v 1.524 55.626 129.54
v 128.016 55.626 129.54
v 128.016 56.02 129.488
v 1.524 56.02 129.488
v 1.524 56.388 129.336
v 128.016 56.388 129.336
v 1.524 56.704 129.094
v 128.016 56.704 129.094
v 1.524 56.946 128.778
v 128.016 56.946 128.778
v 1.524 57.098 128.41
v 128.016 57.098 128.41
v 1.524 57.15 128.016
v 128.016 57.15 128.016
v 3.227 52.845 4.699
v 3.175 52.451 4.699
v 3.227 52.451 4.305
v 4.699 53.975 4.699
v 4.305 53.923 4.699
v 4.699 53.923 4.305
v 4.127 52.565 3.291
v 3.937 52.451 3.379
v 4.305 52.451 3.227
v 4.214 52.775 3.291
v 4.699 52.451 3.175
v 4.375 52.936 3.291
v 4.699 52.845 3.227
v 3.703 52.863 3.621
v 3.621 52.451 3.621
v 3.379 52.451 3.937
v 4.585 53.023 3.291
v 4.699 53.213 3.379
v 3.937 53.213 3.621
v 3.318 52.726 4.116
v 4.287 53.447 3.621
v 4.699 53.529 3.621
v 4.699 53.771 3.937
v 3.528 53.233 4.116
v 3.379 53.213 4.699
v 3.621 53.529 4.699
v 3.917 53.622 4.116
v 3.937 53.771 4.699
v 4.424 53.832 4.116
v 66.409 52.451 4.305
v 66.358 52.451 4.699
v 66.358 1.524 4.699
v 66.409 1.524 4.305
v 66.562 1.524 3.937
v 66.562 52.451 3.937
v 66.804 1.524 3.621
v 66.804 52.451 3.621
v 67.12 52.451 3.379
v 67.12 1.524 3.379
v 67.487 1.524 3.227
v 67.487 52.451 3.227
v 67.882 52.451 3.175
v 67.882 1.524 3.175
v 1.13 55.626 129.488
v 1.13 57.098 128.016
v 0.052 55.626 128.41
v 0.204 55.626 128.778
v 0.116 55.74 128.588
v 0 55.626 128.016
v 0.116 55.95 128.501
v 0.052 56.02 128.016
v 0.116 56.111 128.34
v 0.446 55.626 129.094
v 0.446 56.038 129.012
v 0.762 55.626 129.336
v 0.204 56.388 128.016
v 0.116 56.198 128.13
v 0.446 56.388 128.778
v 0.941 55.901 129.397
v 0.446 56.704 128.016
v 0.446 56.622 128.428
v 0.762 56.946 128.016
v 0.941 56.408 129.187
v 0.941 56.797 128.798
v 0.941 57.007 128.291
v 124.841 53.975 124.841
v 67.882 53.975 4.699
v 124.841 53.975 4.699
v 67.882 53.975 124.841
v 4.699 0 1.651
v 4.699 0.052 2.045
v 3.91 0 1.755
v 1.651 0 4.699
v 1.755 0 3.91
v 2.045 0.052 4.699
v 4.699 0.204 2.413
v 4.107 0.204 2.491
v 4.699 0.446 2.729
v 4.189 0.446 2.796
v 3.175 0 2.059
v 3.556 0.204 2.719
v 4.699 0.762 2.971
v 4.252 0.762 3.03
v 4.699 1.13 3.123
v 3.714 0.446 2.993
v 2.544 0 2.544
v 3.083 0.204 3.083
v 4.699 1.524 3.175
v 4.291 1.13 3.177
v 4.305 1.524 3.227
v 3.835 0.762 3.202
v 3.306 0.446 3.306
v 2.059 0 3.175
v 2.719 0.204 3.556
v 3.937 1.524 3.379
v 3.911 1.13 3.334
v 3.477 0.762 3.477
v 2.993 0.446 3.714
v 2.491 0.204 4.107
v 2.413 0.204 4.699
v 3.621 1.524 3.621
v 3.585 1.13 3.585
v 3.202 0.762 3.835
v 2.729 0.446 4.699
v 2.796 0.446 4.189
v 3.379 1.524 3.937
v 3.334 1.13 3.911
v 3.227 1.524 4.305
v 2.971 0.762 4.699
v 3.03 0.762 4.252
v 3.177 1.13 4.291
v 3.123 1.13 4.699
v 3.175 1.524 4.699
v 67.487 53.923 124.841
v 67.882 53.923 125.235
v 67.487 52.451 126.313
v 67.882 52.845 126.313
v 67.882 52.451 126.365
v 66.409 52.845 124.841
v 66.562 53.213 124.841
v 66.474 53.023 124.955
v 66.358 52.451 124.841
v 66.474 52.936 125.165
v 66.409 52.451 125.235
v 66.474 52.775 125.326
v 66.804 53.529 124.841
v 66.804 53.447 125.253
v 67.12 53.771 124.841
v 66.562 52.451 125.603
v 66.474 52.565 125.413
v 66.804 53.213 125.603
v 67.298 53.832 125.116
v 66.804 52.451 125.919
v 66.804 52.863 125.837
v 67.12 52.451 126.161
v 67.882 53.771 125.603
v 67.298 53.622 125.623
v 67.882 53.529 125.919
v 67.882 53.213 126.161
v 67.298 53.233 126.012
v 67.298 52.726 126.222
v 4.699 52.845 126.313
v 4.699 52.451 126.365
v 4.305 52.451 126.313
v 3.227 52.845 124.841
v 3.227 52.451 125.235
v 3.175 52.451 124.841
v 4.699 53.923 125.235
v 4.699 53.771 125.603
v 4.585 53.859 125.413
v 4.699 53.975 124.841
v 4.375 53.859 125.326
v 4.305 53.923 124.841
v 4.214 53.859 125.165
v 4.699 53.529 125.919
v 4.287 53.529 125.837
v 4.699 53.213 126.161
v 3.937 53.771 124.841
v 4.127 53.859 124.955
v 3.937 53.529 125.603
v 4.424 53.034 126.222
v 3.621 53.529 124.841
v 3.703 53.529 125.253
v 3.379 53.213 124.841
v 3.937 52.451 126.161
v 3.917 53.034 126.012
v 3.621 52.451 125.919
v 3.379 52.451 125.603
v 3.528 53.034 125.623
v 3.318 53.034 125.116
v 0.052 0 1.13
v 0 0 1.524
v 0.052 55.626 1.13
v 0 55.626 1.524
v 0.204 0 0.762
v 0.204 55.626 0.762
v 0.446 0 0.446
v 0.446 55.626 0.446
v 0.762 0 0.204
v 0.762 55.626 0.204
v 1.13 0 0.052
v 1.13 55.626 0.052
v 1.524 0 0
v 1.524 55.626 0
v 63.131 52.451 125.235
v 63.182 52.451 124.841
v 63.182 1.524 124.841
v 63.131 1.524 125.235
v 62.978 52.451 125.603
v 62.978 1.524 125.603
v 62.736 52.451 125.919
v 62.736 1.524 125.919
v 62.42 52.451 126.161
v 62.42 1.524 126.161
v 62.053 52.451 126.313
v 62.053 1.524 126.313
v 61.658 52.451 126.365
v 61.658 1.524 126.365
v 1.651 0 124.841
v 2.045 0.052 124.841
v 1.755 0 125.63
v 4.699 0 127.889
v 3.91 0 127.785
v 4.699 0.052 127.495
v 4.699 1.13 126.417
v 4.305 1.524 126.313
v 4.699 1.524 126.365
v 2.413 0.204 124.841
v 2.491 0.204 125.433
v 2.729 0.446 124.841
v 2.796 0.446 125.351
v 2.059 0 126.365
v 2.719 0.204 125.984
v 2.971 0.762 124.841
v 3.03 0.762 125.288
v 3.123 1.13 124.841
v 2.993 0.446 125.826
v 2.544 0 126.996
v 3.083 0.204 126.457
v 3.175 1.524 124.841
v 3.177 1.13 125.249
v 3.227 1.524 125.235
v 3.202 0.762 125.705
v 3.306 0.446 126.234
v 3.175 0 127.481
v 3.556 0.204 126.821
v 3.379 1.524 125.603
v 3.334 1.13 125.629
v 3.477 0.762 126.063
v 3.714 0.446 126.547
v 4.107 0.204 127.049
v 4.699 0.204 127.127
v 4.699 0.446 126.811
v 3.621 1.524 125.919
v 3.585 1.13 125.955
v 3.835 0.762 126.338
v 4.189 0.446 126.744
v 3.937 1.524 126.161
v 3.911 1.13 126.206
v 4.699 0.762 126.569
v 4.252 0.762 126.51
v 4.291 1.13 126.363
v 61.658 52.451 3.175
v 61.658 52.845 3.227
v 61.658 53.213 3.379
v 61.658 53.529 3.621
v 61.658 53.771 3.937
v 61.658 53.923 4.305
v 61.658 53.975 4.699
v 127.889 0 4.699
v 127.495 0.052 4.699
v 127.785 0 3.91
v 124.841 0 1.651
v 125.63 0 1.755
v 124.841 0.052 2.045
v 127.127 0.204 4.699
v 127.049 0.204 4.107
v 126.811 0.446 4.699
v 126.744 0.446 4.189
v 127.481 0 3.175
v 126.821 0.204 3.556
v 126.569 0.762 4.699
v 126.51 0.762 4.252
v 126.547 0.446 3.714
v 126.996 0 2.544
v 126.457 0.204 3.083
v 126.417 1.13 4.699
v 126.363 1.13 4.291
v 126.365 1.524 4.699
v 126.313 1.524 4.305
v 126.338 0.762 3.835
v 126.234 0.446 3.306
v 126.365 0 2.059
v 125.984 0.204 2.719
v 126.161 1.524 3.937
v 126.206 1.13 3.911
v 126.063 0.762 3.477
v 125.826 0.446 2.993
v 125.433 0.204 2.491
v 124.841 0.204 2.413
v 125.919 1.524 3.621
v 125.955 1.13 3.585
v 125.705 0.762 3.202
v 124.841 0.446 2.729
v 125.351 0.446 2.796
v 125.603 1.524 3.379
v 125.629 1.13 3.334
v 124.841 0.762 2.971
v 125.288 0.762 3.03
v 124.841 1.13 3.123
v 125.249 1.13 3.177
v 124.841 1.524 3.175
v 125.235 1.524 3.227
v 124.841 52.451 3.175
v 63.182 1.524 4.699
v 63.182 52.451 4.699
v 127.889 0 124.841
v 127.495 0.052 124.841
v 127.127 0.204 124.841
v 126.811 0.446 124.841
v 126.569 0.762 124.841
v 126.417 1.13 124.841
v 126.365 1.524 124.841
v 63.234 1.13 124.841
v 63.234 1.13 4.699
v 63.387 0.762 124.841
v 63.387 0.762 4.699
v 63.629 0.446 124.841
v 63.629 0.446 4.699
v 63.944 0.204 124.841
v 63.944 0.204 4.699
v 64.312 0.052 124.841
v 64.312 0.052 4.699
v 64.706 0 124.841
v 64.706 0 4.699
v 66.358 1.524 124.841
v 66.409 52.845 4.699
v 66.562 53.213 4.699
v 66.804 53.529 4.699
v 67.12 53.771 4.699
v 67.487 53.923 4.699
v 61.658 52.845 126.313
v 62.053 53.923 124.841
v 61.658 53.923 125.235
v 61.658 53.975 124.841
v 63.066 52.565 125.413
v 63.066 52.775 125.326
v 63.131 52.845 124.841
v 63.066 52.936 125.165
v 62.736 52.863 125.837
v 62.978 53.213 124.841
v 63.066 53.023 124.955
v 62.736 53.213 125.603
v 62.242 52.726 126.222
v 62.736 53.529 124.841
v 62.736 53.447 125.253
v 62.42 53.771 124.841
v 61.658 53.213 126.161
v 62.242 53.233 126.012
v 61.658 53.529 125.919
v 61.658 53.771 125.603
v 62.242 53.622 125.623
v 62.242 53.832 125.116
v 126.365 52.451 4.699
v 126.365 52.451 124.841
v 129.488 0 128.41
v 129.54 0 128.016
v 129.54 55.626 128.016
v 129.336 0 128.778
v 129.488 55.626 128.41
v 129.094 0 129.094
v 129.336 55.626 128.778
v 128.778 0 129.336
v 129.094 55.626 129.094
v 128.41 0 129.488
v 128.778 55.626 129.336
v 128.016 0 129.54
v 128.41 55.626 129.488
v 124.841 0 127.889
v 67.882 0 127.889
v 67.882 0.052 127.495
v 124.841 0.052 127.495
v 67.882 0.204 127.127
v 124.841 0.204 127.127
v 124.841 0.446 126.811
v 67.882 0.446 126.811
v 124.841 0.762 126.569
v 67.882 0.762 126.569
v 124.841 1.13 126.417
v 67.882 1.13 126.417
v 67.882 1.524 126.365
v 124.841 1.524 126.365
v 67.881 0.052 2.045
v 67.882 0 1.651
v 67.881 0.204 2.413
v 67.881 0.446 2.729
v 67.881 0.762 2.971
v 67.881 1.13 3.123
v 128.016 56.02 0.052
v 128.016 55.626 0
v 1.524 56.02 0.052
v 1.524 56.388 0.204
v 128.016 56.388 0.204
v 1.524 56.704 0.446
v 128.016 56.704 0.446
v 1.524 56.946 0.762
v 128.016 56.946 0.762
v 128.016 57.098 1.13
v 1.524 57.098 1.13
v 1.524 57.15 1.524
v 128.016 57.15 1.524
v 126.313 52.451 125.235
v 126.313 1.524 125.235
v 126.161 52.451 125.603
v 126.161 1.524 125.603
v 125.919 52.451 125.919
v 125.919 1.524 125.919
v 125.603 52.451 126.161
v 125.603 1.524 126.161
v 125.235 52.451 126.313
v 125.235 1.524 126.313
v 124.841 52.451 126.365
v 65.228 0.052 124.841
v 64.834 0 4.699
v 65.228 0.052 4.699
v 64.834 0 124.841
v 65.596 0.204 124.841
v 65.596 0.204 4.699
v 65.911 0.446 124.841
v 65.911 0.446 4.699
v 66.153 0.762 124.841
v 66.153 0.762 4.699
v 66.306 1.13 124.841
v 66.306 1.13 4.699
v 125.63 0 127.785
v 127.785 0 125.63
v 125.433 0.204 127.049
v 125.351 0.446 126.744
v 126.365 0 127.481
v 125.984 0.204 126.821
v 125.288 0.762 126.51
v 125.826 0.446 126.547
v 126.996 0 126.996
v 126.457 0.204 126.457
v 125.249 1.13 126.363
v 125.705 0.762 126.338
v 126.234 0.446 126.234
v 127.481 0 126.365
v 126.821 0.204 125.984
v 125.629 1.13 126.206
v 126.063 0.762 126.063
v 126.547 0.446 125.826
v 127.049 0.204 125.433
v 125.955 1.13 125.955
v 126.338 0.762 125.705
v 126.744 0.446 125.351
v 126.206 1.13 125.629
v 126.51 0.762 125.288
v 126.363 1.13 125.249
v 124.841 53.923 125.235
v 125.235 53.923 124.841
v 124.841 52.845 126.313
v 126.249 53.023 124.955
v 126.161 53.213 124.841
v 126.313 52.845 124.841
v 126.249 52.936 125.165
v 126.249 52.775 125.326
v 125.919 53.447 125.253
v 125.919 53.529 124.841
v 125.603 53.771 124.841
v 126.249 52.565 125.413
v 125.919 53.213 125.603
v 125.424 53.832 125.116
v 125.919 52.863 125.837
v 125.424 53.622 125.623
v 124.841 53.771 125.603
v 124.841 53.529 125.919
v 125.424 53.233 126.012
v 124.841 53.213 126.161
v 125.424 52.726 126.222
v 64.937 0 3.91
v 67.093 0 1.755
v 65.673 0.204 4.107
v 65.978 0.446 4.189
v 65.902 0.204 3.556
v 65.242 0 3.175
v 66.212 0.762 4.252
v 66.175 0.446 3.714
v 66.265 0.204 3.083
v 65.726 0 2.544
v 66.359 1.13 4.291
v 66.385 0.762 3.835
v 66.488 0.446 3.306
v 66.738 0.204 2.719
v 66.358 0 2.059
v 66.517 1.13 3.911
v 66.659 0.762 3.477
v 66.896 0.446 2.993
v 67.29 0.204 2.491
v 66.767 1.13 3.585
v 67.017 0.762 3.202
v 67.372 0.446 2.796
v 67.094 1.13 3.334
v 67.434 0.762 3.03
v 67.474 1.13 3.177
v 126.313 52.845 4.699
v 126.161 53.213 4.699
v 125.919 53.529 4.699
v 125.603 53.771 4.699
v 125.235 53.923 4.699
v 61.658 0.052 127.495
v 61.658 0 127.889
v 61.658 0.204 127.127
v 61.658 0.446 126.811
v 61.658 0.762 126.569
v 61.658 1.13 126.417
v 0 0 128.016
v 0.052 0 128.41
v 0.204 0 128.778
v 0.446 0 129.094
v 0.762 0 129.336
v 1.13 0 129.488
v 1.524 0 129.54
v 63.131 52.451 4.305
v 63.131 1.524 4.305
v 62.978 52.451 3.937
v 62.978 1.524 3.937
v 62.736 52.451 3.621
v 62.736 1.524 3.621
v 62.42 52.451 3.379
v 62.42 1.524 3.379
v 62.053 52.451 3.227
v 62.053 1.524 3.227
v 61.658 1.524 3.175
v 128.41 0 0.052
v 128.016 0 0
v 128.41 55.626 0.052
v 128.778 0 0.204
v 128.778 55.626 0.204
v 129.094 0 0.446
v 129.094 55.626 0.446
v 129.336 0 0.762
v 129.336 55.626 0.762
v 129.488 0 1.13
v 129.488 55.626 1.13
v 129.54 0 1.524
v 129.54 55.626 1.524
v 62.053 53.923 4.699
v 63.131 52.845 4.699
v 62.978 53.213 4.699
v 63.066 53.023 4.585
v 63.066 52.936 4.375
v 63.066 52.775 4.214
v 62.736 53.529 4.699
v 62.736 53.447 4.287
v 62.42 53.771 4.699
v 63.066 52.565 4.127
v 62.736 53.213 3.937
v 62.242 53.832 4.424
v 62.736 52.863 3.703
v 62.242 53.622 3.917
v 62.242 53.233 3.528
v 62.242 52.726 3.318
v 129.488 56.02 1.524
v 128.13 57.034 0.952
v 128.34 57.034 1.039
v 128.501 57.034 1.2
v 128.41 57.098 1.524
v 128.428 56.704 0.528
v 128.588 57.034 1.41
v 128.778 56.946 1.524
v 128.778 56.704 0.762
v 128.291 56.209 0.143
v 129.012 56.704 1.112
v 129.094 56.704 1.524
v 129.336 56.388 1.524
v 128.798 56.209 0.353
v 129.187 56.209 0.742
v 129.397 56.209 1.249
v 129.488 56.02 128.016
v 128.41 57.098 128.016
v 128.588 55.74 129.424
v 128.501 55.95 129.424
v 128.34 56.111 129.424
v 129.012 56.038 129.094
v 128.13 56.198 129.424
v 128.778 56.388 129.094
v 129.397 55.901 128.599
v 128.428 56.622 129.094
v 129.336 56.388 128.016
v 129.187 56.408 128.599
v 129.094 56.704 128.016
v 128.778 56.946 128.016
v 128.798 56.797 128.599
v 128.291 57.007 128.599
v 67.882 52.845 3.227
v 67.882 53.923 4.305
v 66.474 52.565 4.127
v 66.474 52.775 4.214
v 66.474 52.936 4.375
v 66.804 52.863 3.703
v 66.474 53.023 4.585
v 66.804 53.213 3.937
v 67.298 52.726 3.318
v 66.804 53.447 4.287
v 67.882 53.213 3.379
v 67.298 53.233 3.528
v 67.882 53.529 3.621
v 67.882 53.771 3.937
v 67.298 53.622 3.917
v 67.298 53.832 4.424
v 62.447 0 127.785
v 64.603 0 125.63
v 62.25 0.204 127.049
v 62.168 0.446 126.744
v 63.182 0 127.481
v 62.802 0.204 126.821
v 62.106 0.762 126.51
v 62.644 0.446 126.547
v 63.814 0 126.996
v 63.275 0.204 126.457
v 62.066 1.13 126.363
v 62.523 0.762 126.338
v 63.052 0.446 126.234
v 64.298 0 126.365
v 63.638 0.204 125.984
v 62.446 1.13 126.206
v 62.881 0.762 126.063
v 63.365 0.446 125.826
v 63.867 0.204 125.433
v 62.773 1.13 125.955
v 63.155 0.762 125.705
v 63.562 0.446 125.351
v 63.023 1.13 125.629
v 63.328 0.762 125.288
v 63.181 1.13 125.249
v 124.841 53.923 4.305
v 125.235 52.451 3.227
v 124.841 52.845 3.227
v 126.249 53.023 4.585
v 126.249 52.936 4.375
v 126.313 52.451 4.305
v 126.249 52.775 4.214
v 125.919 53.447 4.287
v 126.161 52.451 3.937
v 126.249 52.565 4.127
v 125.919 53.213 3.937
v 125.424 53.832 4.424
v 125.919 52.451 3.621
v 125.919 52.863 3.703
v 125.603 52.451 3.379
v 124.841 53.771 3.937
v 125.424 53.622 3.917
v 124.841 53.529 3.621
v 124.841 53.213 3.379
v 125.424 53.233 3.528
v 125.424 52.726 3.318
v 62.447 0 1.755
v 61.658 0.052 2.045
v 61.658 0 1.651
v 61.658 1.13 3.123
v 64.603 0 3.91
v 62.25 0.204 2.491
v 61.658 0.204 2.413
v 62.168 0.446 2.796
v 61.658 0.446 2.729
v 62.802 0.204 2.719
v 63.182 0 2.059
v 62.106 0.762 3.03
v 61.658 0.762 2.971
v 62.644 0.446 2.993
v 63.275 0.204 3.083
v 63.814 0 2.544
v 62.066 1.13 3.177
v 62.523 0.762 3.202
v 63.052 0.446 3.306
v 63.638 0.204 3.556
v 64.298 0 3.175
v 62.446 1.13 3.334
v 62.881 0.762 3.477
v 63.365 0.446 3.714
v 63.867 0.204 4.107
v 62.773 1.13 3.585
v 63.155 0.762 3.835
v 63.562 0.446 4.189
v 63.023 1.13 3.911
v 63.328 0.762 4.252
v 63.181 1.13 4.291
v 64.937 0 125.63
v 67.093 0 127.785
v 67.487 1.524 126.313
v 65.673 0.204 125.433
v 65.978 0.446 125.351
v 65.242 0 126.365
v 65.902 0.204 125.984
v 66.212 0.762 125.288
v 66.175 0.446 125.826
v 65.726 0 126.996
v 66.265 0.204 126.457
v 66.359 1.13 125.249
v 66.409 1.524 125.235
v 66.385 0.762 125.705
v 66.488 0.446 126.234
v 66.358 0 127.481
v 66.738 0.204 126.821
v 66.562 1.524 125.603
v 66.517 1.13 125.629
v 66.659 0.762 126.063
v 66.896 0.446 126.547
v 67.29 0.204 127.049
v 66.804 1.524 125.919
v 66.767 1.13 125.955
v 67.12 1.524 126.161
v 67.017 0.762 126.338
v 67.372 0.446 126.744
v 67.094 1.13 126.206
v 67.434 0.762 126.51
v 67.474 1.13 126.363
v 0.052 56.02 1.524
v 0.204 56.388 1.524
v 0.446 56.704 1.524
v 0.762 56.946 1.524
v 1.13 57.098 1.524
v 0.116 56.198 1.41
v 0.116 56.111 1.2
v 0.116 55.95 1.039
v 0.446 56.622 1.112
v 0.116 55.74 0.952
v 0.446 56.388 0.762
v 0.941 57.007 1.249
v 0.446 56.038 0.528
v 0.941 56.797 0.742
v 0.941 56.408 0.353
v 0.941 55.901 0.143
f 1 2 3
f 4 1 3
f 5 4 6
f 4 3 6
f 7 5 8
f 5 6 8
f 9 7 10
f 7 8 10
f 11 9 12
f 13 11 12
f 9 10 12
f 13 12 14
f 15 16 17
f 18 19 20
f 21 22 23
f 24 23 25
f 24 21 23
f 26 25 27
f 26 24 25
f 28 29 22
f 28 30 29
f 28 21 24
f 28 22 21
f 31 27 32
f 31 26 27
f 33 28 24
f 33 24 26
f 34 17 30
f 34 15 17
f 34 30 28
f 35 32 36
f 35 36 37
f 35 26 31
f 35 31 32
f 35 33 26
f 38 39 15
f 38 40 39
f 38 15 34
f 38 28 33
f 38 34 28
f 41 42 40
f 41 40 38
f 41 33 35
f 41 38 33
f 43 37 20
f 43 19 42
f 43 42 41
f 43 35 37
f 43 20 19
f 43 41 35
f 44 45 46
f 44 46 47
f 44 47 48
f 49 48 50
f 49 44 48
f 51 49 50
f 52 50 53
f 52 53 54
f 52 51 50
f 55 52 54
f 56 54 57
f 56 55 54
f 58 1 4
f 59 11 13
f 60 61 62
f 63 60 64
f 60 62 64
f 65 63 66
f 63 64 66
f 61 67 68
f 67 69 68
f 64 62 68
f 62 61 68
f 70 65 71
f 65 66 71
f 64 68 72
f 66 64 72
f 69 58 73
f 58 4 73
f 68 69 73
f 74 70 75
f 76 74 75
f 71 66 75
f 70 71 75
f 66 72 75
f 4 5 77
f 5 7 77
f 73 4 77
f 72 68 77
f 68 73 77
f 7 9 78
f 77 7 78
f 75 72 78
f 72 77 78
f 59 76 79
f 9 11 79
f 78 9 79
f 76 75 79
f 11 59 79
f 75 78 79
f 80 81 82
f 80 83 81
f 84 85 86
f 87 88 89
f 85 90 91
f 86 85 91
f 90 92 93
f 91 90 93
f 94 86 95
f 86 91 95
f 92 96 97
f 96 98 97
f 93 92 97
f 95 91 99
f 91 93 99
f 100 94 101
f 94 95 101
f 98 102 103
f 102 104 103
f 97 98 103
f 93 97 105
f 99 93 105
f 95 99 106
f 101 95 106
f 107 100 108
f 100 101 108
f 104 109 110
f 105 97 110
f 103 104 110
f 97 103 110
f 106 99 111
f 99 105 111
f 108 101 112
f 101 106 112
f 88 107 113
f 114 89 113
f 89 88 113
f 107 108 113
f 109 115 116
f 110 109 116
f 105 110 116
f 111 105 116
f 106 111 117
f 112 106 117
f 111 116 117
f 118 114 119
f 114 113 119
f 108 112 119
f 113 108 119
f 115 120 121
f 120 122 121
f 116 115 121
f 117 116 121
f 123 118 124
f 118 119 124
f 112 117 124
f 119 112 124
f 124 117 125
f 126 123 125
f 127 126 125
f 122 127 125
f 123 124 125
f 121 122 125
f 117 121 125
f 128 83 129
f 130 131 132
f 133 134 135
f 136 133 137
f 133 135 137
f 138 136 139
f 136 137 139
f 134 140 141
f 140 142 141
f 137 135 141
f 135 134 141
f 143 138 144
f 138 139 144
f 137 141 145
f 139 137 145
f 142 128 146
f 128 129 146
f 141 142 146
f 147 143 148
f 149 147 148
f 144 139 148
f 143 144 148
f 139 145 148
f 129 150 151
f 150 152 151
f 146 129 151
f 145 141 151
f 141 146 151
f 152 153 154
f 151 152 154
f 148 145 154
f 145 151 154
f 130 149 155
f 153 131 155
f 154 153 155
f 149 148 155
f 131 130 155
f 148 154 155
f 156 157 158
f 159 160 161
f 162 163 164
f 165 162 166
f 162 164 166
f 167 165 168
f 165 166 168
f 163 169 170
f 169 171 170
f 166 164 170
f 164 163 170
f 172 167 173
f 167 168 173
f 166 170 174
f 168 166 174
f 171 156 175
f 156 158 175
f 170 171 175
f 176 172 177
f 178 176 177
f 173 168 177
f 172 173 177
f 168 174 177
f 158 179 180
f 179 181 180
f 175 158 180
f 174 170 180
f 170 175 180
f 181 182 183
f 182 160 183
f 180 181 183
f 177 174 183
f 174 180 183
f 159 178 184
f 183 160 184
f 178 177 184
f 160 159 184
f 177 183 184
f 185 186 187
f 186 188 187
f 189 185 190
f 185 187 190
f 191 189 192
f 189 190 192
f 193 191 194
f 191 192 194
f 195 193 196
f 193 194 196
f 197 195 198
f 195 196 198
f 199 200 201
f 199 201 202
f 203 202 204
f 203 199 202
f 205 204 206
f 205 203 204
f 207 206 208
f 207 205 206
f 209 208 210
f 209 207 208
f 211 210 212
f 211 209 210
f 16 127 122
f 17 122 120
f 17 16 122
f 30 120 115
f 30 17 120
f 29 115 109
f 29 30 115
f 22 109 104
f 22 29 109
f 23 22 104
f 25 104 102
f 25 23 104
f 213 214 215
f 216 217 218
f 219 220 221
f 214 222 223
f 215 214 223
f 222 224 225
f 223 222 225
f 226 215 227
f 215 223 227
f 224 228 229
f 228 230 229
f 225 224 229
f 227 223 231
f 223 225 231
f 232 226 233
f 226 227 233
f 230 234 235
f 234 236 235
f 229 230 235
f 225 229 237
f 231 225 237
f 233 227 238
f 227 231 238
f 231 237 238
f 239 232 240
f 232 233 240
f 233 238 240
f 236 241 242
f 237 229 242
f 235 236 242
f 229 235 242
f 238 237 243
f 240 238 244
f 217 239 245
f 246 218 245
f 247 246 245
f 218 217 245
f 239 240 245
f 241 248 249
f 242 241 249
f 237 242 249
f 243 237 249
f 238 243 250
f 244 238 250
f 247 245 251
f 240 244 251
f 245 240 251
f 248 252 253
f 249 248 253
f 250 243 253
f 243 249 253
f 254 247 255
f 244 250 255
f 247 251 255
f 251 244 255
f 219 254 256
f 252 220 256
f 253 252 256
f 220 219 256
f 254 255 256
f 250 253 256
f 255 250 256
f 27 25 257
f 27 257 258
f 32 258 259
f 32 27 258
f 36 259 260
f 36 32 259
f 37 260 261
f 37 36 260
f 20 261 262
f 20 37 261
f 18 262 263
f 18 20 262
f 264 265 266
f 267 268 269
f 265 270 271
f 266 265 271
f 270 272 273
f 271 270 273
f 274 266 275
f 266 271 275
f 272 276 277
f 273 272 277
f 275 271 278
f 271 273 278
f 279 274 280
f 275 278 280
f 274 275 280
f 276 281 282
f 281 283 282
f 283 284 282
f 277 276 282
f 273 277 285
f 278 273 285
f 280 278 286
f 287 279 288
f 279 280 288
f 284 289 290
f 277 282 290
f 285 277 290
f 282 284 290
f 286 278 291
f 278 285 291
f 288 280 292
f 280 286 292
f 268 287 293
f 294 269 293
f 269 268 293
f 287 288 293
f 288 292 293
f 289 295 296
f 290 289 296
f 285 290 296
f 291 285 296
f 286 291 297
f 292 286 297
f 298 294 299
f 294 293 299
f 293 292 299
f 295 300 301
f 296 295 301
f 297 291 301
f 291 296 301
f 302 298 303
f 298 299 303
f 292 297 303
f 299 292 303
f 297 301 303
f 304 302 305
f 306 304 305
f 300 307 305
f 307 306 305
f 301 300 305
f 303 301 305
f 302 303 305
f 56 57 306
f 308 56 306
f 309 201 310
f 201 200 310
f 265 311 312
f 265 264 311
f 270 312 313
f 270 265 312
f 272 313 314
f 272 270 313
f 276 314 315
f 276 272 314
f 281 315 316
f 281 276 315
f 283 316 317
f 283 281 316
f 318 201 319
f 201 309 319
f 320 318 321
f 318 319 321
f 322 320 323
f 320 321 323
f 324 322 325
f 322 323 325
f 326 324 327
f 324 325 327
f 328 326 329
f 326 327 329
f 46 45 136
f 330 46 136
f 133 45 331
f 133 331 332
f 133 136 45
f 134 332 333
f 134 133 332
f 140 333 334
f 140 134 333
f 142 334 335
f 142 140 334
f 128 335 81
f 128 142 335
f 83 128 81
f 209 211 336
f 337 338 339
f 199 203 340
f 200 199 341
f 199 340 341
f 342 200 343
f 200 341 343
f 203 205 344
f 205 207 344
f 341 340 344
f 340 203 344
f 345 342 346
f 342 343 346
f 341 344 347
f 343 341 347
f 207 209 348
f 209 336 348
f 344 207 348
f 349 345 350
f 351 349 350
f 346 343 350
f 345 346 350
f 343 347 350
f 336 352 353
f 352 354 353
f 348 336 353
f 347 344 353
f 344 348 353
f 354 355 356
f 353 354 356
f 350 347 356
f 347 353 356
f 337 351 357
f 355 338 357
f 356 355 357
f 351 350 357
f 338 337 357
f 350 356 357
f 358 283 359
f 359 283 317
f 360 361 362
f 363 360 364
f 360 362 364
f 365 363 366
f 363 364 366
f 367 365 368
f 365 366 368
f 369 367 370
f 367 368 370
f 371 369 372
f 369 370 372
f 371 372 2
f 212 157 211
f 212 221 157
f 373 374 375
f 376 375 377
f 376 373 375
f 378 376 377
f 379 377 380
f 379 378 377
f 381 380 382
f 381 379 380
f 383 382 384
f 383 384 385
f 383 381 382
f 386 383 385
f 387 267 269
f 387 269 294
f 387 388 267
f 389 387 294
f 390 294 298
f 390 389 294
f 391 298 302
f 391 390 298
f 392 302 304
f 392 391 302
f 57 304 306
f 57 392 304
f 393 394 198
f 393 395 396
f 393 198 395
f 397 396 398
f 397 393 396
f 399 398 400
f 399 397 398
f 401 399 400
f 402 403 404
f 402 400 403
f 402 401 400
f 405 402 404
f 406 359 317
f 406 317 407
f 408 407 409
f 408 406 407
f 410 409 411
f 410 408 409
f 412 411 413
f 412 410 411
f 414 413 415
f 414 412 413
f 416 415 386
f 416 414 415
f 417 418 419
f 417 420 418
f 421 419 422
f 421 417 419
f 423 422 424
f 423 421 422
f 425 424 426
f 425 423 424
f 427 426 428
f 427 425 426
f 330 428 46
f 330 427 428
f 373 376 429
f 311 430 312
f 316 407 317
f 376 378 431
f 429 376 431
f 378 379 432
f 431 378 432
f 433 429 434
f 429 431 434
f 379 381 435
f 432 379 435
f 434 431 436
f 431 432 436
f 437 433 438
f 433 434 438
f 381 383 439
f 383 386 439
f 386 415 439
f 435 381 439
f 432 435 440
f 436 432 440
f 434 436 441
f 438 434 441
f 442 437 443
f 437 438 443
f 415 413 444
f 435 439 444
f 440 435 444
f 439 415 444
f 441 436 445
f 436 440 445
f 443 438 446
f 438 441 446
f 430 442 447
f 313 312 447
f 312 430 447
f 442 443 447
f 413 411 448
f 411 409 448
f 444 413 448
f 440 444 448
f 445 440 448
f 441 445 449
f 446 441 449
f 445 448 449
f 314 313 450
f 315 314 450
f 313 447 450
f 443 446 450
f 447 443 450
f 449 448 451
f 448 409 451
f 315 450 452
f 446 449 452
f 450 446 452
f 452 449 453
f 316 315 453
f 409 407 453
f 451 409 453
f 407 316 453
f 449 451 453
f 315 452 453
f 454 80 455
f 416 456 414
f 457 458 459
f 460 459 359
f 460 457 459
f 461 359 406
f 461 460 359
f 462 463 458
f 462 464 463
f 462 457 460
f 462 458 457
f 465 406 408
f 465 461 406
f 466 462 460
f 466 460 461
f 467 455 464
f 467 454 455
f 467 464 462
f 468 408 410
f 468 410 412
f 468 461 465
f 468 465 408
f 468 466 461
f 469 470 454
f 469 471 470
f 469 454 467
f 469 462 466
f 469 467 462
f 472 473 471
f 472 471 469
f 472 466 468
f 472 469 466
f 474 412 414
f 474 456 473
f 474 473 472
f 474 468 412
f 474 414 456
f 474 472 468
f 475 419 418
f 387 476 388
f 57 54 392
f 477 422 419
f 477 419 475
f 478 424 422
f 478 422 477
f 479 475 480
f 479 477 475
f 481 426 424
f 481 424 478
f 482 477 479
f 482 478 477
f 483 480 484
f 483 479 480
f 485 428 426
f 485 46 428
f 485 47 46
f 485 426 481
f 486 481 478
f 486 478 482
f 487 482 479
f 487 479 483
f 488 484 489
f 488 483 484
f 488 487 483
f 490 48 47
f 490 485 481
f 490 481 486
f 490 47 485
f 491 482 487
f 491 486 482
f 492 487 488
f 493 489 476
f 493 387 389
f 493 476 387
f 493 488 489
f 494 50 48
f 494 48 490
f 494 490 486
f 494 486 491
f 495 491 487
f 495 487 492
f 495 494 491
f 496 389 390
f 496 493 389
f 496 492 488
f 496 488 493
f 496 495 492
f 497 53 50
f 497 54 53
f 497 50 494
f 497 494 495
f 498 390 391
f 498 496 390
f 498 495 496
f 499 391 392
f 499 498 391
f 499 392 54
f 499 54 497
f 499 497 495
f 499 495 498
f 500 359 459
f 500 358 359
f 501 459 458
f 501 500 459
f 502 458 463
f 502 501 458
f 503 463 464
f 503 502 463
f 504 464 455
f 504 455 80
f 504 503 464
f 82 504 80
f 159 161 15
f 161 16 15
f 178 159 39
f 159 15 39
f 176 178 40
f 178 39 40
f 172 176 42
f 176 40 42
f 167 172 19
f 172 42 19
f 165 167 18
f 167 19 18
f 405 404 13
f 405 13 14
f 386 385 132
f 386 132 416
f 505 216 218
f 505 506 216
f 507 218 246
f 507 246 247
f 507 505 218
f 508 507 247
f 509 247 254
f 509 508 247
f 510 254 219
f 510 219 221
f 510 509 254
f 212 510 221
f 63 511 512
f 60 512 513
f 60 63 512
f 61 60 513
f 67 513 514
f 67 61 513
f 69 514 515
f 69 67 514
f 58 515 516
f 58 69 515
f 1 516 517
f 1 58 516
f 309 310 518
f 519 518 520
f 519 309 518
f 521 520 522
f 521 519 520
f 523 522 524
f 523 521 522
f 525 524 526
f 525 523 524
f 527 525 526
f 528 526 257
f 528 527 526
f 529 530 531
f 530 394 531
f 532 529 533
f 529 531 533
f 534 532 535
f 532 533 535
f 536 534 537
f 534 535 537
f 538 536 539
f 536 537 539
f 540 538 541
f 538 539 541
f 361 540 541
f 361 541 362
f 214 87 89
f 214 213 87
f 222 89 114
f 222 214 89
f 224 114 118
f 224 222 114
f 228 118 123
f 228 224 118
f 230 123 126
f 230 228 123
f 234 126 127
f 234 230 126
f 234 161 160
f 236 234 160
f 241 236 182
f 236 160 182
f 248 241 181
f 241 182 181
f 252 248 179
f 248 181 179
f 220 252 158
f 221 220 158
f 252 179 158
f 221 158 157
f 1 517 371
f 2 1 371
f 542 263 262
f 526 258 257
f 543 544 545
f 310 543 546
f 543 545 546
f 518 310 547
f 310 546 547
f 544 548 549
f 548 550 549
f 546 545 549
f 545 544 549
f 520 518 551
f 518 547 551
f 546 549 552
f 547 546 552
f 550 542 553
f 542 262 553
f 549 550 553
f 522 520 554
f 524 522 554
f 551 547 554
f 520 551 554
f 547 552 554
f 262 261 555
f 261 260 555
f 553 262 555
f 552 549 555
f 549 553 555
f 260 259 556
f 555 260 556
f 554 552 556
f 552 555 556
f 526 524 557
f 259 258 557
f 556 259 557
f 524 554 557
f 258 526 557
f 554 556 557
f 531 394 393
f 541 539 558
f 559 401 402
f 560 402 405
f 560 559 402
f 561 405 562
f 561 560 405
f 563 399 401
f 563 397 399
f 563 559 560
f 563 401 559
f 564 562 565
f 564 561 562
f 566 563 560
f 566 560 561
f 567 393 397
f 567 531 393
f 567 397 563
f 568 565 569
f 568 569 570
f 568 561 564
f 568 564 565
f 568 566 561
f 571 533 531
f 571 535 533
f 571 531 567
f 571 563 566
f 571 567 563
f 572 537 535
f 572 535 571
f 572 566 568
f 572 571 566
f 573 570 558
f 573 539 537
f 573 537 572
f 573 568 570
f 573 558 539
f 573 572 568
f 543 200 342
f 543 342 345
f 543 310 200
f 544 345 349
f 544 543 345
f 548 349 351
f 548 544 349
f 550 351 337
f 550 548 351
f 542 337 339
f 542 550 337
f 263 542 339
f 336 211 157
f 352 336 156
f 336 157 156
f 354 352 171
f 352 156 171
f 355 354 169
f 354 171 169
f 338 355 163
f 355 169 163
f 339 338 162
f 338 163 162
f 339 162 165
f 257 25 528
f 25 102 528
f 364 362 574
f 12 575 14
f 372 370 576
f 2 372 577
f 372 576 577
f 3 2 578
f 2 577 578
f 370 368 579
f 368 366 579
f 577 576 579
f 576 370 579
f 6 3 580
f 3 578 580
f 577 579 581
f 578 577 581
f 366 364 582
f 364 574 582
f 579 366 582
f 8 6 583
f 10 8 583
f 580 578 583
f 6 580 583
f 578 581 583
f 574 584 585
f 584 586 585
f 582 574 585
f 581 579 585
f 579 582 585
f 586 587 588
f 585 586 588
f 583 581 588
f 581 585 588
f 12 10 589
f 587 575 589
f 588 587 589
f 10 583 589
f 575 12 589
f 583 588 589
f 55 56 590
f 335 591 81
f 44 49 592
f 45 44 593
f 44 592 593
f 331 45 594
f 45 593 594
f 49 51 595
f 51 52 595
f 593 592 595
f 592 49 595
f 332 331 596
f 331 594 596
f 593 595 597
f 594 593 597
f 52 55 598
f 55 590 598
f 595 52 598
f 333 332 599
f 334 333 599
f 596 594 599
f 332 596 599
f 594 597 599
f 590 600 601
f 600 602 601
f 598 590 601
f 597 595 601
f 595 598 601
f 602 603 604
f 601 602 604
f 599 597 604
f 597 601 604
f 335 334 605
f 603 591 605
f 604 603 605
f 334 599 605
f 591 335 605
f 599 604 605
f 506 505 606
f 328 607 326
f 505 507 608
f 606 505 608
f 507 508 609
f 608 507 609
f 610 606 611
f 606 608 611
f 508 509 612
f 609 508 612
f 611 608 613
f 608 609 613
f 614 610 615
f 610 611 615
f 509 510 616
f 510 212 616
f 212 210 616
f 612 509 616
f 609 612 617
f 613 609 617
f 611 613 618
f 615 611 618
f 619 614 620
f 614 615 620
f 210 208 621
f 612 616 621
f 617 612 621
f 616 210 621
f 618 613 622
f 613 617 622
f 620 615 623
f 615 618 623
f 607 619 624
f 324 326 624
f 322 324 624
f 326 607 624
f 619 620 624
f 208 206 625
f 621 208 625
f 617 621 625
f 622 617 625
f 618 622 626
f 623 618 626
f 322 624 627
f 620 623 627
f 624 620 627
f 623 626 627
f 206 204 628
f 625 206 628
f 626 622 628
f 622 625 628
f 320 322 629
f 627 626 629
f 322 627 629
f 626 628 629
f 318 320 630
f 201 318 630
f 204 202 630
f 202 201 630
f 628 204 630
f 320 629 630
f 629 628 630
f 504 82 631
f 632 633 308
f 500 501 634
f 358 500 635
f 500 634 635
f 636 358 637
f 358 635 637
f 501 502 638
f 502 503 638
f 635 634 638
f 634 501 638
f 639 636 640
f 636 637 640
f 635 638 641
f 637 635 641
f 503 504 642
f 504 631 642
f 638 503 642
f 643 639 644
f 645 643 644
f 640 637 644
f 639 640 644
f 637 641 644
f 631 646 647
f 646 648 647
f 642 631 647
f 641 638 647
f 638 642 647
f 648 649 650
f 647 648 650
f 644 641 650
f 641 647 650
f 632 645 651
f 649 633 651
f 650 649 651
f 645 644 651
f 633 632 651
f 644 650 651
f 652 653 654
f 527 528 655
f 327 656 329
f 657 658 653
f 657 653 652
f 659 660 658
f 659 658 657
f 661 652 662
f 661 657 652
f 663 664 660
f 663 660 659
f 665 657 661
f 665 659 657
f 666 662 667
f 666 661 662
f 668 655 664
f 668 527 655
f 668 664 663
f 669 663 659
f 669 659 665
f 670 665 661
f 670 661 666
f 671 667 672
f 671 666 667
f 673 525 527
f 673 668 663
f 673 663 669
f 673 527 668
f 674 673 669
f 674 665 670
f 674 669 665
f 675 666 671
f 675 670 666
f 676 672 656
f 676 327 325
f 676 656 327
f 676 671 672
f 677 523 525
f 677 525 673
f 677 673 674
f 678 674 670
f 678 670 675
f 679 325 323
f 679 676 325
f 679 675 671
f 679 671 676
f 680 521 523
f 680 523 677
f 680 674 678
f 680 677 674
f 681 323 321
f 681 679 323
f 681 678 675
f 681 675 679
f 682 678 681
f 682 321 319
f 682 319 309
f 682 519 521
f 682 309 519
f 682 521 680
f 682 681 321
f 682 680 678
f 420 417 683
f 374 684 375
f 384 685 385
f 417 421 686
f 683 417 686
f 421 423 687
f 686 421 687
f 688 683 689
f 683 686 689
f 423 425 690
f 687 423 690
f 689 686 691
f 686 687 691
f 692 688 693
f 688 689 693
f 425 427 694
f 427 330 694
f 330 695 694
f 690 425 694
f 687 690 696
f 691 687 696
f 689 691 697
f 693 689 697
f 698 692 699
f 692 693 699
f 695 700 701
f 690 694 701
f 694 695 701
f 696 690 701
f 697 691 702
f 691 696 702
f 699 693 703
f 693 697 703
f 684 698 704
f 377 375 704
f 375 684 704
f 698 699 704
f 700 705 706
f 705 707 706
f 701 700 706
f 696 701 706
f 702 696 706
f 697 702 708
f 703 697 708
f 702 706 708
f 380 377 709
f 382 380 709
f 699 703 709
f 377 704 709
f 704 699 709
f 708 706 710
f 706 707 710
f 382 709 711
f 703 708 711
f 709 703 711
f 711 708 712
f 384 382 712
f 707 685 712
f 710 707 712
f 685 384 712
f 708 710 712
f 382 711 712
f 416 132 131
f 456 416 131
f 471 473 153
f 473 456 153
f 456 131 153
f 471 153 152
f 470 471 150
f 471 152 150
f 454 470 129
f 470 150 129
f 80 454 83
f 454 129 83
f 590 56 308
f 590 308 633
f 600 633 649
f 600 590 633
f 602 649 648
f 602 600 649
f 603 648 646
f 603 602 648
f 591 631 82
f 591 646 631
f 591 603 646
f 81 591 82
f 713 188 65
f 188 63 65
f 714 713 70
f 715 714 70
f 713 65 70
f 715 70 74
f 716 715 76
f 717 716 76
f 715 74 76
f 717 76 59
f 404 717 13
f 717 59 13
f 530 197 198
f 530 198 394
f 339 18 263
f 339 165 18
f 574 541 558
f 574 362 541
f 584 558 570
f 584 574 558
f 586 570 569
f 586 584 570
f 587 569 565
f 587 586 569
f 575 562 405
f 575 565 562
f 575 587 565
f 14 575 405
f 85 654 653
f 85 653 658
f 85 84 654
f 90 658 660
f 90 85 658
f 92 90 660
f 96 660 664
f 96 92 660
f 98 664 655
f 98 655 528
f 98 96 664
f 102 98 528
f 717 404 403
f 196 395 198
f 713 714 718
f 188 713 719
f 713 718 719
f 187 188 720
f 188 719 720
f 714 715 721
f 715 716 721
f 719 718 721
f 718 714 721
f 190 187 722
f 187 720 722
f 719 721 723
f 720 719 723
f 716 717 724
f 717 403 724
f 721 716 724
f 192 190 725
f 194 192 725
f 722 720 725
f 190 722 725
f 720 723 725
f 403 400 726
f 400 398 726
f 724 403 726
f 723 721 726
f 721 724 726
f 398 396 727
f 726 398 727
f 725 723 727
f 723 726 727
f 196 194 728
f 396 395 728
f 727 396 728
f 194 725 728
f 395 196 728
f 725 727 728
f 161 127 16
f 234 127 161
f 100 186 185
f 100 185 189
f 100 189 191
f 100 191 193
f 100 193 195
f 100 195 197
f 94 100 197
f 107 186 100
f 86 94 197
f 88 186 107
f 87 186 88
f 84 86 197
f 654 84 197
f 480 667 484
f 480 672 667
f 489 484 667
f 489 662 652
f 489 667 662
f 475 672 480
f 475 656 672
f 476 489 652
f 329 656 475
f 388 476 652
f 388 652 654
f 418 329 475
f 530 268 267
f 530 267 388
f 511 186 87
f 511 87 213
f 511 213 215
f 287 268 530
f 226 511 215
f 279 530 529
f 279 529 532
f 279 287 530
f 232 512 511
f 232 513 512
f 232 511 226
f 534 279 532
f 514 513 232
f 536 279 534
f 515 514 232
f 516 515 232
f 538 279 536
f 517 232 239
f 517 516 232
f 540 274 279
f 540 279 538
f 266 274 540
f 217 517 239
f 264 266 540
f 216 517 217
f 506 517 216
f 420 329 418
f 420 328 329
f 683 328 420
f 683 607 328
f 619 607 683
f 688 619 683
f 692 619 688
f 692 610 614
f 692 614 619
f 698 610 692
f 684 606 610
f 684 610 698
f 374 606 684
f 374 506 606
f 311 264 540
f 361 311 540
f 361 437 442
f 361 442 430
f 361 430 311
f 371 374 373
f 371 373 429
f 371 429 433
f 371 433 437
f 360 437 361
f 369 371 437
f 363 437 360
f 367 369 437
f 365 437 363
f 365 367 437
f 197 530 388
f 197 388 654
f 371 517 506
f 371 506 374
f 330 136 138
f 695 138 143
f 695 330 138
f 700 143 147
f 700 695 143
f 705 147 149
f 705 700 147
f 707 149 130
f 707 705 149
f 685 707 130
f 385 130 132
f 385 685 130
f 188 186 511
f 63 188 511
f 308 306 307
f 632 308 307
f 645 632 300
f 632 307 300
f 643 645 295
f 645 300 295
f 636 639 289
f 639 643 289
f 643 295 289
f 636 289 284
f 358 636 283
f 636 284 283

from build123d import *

# Parameters (mm, degrees)
F0_W     = 129.54
F0_H     = 129.54
F1_DEPTH = 57.15
F2_T     = -3.175
F3_R     = 1.524
F4_R     = 1.524
F5_W     = 3.175
F5_H     = 1.524
F5_H_2   = 120.142
F6_DEPTH = 53.975
F7_R     = 1.524


with BuildPart() as f1:
    # F0 (on Front) → F1 (new body)
    with BuildSketch(Plane.XZ):
        with Locations((64.77, 64.77)):
            Rectangle(F0_W, F0_H)
    extrude(amount=-F1_DEPTH)

    # F2
    f2_openings = [f1.faces().sort_by_distance(p)[0] for p in [
        (64.77, 0, 64.77),
    ]]
    offset(amount=F2_T, openings=f2_openings)

    # F3
    f3_edges = [f1.edges().sort_by_distance(p)[0] for p in [
        (3.175, 26.9875, 126.365),
        (64.77, 53.975, 126.365),
        (3.175, 53.975, 64.77),
        (3.175, 26.9875, 3.175),
        (64.77, 53.975, 3.175),
        (126.365, 53.975, 64.77),
        (126.365, 26.9875, 126.365),
        (126.365, 26.9875, 3.175),
    ]]
    fillet(f3_edges, radius=F3_R)

    # F4
    f4_edges = [f1.edges().sort_by_distance(p)[0] for p in [
        (129.54, 28.575, 0),
        (64.77, 57.15, 0),
        (129.54, 57.15, 64.77),
        (129.54, 28.575, 129.54),
        (64.77, 57.15, 129.54),
        (0, 28.575, 129.54),
        (0, 57.15, 64.77),
        (0, 28.575, 0),
    ]]
    fillet(f4_edges, radius=F4_R)

    # F5 (on face) → F6 (join)
    with BuildSketch(Plane.XZ.offset(-53.975)):
        with Locations((64.77, 125.603)):
            Rectangle(F5_W, F5_H)
        with Locations((64.77, 64.77)):
            Rectangle(F5_W, F5_H_2)
        with Locations((64.77, 3.937)):
            Rectangle(F5_W, F5_H)
    extrude(amount=F6_DEPTH)

    # F7
    f7_edges = [f1.edges().sort_by_distance(p)[0] for p in [
        (33.94075, 0, 126.365),
        (63.1825, 0, 64.77),
        (63.1825, 53.528631, 125.918631),
        (63.1825, 53.975, 64.77),
        (63.1825, 53.528631, 3.621369),
        (63.1825, 26.2255, 3.175),
        (63.1825, 26.2255, 126.365),
        (95.59925, 0, 126.365),
        (66.3575, 26.2255, 126.365),
        (95.59925, 52.451, 126.365),
        (124.841, 26.2255, 126.365),
        (126.365, 0, 64.77),
        (126.365, 26.2255, 4.699),
        (126.365, 26.2255, 124.841),
        (126.365, 52.451, 64.77),
        (3.175, 0, 64.77),
        (3.621369, 0, 125.918631),
        (33.94075, 0, 3.175),
        (3.621369, 0, 3.621369),
        (125.918631, 0, 125.918631),
        (125.918631, 0, 3.621369),
        (95.59925, 0, 3.175),
        (66.3575, 0, 64.77),
        (66.3575, 26.2255, 3.175),
        (66.3575, 53.528631, 3.621369),
        (66.3575, 53.975, 64.77),
        (66.3575, 53.528631, 125.918631),
    ]]
    fillet(f7_edges, radius=F7_R)


solid = f1.part
